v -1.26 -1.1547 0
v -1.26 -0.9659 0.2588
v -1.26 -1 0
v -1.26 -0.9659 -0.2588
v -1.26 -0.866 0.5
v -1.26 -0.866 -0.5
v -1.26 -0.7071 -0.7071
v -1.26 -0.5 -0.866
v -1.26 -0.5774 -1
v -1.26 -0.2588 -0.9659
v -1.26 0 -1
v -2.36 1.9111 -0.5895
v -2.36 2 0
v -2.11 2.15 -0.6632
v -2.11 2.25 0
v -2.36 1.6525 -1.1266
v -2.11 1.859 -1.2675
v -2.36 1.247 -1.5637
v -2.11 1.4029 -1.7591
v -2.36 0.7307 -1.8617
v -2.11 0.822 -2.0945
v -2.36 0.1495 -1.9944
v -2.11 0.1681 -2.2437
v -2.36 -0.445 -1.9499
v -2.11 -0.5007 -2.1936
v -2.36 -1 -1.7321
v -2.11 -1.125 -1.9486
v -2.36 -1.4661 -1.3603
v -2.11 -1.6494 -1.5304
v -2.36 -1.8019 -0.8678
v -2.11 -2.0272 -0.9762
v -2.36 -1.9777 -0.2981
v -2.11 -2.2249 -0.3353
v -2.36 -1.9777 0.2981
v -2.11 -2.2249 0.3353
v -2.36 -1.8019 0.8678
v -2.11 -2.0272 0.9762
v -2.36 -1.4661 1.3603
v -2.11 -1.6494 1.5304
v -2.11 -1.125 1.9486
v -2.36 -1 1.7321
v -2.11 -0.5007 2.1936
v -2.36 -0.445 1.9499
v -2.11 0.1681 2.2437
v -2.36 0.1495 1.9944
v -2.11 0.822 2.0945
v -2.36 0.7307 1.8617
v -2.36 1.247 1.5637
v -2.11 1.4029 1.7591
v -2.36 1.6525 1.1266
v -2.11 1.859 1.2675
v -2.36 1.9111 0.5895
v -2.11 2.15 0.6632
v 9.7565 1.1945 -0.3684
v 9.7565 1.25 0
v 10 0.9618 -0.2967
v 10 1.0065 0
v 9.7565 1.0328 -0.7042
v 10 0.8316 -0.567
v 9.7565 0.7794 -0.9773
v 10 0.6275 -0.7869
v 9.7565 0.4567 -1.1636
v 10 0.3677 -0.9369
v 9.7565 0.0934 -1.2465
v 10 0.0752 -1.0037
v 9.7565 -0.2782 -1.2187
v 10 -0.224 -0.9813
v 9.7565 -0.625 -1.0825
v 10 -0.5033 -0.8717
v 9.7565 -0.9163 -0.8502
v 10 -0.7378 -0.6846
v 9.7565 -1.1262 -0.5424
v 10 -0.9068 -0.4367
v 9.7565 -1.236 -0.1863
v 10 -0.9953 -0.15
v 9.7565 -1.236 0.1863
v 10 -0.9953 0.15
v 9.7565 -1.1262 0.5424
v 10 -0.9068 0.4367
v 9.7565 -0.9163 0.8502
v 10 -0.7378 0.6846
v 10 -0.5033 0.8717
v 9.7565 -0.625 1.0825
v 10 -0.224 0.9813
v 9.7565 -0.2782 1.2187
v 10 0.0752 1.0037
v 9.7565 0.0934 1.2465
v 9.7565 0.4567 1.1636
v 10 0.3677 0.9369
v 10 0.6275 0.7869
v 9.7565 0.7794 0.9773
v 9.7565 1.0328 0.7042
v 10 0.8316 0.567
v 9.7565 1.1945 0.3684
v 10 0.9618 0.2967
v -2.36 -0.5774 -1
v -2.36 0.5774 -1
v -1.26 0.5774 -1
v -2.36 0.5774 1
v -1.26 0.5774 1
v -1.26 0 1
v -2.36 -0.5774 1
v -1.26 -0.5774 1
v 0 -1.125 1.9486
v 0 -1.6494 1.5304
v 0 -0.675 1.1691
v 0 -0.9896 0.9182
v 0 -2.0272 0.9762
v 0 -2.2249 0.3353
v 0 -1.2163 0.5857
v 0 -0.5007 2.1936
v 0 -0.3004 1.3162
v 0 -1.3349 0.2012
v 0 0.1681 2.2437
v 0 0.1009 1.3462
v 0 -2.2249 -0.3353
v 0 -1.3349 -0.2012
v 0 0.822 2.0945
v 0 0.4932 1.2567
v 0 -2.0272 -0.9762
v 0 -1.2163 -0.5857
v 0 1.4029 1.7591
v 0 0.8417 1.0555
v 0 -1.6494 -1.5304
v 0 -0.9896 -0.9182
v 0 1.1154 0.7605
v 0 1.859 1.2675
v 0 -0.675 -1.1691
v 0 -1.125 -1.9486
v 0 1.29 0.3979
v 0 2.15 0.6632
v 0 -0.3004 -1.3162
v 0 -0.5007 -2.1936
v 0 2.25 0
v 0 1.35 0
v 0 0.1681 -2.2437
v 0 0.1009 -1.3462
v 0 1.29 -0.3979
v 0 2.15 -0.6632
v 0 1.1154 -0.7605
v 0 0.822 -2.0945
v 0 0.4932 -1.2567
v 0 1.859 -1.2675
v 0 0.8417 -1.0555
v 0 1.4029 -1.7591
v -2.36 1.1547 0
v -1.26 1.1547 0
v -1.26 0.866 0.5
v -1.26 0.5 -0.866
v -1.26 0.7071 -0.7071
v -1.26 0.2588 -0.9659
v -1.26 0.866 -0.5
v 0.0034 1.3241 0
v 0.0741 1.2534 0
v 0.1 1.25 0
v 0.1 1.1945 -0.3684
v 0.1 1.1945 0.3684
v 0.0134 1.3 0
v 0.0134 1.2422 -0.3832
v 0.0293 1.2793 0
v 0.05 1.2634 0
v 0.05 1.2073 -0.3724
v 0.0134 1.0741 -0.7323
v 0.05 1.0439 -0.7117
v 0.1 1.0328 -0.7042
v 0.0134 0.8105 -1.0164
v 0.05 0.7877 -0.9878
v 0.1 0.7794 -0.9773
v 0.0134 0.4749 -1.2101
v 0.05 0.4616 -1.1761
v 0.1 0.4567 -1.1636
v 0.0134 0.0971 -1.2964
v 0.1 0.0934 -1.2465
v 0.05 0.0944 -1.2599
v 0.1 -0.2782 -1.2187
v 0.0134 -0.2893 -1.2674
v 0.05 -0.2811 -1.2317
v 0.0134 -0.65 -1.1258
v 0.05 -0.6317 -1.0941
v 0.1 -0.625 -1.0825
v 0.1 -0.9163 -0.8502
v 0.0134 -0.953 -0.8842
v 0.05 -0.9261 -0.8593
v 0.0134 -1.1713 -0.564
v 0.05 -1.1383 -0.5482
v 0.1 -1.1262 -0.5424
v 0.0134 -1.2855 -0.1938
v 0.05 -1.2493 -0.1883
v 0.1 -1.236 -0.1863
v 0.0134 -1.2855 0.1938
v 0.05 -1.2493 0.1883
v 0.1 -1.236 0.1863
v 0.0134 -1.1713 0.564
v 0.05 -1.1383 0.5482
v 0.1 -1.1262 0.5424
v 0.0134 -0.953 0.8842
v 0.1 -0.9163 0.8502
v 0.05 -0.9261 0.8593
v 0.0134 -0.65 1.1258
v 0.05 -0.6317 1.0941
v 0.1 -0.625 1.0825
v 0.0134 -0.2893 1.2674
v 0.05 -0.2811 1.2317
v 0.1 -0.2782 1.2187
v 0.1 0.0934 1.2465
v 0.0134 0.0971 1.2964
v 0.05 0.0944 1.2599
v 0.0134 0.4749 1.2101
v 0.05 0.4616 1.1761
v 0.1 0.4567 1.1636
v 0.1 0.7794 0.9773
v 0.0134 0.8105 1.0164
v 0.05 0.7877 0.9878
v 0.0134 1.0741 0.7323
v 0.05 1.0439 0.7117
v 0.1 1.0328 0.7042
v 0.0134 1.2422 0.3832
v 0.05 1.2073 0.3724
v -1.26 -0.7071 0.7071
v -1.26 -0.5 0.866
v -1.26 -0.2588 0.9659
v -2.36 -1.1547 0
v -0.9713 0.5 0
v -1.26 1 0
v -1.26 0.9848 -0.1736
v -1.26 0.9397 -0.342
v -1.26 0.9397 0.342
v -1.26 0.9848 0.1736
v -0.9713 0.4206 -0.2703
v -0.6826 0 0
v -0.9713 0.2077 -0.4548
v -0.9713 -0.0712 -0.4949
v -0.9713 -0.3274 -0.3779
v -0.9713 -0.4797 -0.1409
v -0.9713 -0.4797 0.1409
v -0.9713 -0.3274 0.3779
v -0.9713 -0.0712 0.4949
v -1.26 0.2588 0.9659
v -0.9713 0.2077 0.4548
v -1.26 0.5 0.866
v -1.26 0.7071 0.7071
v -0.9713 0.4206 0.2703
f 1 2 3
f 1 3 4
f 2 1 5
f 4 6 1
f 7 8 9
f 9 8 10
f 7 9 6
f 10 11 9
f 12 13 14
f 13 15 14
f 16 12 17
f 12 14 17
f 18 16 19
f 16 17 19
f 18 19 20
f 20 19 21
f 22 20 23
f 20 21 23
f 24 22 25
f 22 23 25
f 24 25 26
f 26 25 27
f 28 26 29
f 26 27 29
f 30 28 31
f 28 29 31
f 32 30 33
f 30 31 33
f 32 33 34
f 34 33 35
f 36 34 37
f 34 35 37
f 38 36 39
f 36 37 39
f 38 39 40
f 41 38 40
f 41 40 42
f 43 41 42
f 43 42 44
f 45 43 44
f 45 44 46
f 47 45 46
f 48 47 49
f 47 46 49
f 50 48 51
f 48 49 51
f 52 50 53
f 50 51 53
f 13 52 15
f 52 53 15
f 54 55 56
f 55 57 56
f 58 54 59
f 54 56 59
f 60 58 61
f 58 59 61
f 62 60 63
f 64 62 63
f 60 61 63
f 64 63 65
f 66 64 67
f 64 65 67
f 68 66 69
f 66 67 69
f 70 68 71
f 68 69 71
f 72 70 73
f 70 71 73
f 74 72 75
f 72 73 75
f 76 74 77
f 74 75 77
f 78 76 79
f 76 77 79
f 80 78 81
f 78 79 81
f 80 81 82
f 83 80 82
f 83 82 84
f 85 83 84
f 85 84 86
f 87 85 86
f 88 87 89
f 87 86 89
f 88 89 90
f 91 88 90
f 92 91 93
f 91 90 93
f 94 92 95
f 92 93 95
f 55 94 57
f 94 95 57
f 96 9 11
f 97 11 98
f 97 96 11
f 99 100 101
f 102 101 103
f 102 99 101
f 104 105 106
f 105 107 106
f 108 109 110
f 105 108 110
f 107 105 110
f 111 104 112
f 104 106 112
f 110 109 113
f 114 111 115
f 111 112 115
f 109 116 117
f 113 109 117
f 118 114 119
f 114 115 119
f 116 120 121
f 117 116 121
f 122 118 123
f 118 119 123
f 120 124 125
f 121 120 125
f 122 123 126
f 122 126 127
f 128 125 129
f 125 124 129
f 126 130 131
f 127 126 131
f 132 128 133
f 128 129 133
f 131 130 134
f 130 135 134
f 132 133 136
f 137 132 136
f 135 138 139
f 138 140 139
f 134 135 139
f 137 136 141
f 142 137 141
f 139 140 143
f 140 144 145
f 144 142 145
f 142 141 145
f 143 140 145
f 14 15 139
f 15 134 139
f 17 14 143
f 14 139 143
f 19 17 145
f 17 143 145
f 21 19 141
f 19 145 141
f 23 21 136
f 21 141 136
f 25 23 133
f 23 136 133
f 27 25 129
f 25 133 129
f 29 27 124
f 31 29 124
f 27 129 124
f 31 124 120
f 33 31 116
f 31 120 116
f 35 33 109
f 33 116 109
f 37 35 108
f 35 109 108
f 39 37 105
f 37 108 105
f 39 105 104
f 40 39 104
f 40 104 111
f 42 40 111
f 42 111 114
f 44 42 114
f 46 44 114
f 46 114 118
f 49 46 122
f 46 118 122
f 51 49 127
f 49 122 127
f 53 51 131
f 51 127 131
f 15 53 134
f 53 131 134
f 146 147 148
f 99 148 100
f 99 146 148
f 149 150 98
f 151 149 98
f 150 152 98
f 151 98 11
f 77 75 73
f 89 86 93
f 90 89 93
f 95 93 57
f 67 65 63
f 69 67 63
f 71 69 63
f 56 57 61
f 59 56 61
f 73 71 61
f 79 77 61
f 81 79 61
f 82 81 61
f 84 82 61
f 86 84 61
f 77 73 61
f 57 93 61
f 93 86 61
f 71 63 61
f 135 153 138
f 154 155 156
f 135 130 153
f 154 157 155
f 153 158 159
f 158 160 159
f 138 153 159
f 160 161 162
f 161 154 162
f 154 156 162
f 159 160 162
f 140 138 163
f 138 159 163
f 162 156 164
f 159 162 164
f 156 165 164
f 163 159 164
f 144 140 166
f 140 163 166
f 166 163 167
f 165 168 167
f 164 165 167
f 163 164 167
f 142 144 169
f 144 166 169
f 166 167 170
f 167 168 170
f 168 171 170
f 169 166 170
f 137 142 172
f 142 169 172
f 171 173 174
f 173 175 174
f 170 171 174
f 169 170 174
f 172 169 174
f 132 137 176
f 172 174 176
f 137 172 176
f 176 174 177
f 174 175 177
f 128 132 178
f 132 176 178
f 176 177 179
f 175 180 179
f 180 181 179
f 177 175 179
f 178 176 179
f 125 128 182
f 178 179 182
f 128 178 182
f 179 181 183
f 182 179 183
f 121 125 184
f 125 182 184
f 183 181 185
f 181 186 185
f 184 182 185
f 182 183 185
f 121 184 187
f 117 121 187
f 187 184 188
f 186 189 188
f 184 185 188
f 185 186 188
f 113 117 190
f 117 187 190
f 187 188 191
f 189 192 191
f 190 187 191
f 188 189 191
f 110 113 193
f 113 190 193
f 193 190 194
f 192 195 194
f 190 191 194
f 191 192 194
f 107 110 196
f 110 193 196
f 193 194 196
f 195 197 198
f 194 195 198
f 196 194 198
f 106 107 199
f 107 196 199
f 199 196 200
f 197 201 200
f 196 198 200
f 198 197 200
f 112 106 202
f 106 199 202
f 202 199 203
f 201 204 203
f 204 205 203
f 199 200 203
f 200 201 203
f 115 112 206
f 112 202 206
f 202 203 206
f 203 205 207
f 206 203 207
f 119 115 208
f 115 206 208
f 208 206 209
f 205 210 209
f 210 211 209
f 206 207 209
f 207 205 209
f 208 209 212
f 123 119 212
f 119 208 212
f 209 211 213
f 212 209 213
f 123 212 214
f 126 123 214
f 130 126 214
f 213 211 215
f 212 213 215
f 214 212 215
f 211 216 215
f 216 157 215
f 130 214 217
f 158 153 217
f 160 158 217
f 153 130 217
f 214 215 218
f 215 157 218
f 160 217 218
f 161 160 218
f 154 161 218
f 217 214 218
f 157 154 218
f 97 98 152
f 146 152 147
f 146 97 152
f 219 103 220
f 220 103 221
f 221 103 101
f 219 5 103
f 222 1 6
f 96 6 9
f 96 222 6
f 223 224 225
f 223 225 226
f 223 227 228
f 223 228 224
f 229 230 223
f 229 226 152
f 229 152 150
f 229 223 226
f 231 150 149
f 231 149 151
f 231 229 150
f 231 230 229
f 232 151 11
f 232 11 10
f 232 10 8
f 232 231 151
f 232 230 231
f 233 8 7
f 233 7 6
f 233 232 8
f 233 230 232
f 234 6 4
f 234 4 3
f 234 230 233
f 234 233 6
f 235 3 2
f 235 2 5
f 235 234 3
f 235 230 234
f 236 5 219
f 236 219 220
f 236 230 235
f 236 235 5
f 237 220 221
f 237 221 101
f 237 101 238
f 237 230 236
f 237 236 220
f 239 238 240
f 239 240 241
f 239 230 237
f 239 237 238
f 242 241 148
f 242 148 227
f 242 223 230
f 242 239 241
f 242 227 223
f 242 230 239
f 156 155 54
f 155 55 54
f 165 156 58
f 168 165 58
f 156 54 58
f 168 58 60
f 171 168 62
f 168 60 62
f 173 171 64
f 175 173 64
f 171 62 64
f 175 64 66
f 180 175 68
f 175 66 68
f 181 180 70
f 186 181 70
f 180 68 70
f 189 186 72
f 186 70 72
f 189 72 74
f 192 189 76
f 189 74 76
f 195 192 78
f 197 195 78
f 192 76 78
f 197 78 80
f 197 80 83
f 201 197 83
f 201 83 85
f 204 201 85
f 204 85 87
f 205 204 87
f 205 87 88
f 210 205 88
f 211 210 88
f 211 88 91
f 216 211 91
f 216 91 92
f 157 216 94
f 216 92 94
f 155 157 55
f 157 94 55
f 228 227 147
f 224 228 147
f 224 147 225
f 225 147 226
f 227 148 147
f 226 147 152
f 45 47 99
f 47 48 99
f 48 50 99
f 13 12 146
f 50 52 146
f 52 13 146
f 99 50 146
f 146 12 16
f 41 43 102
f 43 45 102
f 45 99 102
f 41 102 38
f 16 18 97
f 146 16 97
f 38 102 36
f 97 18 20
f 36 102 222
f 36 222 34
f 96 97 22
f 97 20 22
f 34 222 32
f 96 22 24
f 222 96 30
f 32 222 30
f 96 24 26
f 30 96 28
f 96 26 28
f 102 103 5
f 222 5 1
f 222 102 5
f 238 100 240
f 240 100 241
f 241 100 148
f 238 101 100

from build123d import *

# Parameters (mm, degrees)
CUT_EXTRUDE1_DEPTH = 1.1


with BuildPart() as part:
    # Sketch1 → Revolve1 (revolve)
    with BuildSketch(Plane.XY):
        with BuildLine():
            Line((-2.36, 0), (-2.36, 2))
            Line((-2.36, 2), (-2.11, 2.25))
            Line((-2.11, 2.25), (0, 2.25))
            Line((0, 2.25), (0, 1.35))
            ThreePointArc((0, 1.35), (0.029289322, 1.279289322), (0.1, 1.25))
            Line((0.1, 1.25), (9.7565, 1.25))
            Line((9.7565, 1.25), (10, 1.0065))
            Line((10, 1.0065), (10, 0))
            Line((10, 0), (-2.36, 0))
        make_face()
    revolve(axis=Axis((10, 0, 0), (-1, 0, 0)))

    # Sketch2 → Cut-Extrude1 (cut)
    with BuildSketch(Plane(origin=(-2.36, 0, 0), x_dir=(0, 0, -1), z_dir=(1, 0, 0))):
        Polygon((-1, 0.577350269), (-1, -0.577350269), (0, -1.154700538), (1, -0.577350269), (1, 0.577350269), (0, 1.154700538), align=None)
    extrude(amount=CUT_EXTRUDE1_DEPTH, mode=Mode.SUBTRACT)

    # Sketch3 → Cut-Revolve1 (revolve, cut)
    with BuildSketch(Plane.XY):
        Polygon((-1.26, 0), (-1.26, 1), (-0.682649731, 0), align=None)
    revolve(axis=Axis((-0.682649731, 0, 0), (-1, 0, 0)), mode=Mode.SUBTRACT)


solid = part.part
